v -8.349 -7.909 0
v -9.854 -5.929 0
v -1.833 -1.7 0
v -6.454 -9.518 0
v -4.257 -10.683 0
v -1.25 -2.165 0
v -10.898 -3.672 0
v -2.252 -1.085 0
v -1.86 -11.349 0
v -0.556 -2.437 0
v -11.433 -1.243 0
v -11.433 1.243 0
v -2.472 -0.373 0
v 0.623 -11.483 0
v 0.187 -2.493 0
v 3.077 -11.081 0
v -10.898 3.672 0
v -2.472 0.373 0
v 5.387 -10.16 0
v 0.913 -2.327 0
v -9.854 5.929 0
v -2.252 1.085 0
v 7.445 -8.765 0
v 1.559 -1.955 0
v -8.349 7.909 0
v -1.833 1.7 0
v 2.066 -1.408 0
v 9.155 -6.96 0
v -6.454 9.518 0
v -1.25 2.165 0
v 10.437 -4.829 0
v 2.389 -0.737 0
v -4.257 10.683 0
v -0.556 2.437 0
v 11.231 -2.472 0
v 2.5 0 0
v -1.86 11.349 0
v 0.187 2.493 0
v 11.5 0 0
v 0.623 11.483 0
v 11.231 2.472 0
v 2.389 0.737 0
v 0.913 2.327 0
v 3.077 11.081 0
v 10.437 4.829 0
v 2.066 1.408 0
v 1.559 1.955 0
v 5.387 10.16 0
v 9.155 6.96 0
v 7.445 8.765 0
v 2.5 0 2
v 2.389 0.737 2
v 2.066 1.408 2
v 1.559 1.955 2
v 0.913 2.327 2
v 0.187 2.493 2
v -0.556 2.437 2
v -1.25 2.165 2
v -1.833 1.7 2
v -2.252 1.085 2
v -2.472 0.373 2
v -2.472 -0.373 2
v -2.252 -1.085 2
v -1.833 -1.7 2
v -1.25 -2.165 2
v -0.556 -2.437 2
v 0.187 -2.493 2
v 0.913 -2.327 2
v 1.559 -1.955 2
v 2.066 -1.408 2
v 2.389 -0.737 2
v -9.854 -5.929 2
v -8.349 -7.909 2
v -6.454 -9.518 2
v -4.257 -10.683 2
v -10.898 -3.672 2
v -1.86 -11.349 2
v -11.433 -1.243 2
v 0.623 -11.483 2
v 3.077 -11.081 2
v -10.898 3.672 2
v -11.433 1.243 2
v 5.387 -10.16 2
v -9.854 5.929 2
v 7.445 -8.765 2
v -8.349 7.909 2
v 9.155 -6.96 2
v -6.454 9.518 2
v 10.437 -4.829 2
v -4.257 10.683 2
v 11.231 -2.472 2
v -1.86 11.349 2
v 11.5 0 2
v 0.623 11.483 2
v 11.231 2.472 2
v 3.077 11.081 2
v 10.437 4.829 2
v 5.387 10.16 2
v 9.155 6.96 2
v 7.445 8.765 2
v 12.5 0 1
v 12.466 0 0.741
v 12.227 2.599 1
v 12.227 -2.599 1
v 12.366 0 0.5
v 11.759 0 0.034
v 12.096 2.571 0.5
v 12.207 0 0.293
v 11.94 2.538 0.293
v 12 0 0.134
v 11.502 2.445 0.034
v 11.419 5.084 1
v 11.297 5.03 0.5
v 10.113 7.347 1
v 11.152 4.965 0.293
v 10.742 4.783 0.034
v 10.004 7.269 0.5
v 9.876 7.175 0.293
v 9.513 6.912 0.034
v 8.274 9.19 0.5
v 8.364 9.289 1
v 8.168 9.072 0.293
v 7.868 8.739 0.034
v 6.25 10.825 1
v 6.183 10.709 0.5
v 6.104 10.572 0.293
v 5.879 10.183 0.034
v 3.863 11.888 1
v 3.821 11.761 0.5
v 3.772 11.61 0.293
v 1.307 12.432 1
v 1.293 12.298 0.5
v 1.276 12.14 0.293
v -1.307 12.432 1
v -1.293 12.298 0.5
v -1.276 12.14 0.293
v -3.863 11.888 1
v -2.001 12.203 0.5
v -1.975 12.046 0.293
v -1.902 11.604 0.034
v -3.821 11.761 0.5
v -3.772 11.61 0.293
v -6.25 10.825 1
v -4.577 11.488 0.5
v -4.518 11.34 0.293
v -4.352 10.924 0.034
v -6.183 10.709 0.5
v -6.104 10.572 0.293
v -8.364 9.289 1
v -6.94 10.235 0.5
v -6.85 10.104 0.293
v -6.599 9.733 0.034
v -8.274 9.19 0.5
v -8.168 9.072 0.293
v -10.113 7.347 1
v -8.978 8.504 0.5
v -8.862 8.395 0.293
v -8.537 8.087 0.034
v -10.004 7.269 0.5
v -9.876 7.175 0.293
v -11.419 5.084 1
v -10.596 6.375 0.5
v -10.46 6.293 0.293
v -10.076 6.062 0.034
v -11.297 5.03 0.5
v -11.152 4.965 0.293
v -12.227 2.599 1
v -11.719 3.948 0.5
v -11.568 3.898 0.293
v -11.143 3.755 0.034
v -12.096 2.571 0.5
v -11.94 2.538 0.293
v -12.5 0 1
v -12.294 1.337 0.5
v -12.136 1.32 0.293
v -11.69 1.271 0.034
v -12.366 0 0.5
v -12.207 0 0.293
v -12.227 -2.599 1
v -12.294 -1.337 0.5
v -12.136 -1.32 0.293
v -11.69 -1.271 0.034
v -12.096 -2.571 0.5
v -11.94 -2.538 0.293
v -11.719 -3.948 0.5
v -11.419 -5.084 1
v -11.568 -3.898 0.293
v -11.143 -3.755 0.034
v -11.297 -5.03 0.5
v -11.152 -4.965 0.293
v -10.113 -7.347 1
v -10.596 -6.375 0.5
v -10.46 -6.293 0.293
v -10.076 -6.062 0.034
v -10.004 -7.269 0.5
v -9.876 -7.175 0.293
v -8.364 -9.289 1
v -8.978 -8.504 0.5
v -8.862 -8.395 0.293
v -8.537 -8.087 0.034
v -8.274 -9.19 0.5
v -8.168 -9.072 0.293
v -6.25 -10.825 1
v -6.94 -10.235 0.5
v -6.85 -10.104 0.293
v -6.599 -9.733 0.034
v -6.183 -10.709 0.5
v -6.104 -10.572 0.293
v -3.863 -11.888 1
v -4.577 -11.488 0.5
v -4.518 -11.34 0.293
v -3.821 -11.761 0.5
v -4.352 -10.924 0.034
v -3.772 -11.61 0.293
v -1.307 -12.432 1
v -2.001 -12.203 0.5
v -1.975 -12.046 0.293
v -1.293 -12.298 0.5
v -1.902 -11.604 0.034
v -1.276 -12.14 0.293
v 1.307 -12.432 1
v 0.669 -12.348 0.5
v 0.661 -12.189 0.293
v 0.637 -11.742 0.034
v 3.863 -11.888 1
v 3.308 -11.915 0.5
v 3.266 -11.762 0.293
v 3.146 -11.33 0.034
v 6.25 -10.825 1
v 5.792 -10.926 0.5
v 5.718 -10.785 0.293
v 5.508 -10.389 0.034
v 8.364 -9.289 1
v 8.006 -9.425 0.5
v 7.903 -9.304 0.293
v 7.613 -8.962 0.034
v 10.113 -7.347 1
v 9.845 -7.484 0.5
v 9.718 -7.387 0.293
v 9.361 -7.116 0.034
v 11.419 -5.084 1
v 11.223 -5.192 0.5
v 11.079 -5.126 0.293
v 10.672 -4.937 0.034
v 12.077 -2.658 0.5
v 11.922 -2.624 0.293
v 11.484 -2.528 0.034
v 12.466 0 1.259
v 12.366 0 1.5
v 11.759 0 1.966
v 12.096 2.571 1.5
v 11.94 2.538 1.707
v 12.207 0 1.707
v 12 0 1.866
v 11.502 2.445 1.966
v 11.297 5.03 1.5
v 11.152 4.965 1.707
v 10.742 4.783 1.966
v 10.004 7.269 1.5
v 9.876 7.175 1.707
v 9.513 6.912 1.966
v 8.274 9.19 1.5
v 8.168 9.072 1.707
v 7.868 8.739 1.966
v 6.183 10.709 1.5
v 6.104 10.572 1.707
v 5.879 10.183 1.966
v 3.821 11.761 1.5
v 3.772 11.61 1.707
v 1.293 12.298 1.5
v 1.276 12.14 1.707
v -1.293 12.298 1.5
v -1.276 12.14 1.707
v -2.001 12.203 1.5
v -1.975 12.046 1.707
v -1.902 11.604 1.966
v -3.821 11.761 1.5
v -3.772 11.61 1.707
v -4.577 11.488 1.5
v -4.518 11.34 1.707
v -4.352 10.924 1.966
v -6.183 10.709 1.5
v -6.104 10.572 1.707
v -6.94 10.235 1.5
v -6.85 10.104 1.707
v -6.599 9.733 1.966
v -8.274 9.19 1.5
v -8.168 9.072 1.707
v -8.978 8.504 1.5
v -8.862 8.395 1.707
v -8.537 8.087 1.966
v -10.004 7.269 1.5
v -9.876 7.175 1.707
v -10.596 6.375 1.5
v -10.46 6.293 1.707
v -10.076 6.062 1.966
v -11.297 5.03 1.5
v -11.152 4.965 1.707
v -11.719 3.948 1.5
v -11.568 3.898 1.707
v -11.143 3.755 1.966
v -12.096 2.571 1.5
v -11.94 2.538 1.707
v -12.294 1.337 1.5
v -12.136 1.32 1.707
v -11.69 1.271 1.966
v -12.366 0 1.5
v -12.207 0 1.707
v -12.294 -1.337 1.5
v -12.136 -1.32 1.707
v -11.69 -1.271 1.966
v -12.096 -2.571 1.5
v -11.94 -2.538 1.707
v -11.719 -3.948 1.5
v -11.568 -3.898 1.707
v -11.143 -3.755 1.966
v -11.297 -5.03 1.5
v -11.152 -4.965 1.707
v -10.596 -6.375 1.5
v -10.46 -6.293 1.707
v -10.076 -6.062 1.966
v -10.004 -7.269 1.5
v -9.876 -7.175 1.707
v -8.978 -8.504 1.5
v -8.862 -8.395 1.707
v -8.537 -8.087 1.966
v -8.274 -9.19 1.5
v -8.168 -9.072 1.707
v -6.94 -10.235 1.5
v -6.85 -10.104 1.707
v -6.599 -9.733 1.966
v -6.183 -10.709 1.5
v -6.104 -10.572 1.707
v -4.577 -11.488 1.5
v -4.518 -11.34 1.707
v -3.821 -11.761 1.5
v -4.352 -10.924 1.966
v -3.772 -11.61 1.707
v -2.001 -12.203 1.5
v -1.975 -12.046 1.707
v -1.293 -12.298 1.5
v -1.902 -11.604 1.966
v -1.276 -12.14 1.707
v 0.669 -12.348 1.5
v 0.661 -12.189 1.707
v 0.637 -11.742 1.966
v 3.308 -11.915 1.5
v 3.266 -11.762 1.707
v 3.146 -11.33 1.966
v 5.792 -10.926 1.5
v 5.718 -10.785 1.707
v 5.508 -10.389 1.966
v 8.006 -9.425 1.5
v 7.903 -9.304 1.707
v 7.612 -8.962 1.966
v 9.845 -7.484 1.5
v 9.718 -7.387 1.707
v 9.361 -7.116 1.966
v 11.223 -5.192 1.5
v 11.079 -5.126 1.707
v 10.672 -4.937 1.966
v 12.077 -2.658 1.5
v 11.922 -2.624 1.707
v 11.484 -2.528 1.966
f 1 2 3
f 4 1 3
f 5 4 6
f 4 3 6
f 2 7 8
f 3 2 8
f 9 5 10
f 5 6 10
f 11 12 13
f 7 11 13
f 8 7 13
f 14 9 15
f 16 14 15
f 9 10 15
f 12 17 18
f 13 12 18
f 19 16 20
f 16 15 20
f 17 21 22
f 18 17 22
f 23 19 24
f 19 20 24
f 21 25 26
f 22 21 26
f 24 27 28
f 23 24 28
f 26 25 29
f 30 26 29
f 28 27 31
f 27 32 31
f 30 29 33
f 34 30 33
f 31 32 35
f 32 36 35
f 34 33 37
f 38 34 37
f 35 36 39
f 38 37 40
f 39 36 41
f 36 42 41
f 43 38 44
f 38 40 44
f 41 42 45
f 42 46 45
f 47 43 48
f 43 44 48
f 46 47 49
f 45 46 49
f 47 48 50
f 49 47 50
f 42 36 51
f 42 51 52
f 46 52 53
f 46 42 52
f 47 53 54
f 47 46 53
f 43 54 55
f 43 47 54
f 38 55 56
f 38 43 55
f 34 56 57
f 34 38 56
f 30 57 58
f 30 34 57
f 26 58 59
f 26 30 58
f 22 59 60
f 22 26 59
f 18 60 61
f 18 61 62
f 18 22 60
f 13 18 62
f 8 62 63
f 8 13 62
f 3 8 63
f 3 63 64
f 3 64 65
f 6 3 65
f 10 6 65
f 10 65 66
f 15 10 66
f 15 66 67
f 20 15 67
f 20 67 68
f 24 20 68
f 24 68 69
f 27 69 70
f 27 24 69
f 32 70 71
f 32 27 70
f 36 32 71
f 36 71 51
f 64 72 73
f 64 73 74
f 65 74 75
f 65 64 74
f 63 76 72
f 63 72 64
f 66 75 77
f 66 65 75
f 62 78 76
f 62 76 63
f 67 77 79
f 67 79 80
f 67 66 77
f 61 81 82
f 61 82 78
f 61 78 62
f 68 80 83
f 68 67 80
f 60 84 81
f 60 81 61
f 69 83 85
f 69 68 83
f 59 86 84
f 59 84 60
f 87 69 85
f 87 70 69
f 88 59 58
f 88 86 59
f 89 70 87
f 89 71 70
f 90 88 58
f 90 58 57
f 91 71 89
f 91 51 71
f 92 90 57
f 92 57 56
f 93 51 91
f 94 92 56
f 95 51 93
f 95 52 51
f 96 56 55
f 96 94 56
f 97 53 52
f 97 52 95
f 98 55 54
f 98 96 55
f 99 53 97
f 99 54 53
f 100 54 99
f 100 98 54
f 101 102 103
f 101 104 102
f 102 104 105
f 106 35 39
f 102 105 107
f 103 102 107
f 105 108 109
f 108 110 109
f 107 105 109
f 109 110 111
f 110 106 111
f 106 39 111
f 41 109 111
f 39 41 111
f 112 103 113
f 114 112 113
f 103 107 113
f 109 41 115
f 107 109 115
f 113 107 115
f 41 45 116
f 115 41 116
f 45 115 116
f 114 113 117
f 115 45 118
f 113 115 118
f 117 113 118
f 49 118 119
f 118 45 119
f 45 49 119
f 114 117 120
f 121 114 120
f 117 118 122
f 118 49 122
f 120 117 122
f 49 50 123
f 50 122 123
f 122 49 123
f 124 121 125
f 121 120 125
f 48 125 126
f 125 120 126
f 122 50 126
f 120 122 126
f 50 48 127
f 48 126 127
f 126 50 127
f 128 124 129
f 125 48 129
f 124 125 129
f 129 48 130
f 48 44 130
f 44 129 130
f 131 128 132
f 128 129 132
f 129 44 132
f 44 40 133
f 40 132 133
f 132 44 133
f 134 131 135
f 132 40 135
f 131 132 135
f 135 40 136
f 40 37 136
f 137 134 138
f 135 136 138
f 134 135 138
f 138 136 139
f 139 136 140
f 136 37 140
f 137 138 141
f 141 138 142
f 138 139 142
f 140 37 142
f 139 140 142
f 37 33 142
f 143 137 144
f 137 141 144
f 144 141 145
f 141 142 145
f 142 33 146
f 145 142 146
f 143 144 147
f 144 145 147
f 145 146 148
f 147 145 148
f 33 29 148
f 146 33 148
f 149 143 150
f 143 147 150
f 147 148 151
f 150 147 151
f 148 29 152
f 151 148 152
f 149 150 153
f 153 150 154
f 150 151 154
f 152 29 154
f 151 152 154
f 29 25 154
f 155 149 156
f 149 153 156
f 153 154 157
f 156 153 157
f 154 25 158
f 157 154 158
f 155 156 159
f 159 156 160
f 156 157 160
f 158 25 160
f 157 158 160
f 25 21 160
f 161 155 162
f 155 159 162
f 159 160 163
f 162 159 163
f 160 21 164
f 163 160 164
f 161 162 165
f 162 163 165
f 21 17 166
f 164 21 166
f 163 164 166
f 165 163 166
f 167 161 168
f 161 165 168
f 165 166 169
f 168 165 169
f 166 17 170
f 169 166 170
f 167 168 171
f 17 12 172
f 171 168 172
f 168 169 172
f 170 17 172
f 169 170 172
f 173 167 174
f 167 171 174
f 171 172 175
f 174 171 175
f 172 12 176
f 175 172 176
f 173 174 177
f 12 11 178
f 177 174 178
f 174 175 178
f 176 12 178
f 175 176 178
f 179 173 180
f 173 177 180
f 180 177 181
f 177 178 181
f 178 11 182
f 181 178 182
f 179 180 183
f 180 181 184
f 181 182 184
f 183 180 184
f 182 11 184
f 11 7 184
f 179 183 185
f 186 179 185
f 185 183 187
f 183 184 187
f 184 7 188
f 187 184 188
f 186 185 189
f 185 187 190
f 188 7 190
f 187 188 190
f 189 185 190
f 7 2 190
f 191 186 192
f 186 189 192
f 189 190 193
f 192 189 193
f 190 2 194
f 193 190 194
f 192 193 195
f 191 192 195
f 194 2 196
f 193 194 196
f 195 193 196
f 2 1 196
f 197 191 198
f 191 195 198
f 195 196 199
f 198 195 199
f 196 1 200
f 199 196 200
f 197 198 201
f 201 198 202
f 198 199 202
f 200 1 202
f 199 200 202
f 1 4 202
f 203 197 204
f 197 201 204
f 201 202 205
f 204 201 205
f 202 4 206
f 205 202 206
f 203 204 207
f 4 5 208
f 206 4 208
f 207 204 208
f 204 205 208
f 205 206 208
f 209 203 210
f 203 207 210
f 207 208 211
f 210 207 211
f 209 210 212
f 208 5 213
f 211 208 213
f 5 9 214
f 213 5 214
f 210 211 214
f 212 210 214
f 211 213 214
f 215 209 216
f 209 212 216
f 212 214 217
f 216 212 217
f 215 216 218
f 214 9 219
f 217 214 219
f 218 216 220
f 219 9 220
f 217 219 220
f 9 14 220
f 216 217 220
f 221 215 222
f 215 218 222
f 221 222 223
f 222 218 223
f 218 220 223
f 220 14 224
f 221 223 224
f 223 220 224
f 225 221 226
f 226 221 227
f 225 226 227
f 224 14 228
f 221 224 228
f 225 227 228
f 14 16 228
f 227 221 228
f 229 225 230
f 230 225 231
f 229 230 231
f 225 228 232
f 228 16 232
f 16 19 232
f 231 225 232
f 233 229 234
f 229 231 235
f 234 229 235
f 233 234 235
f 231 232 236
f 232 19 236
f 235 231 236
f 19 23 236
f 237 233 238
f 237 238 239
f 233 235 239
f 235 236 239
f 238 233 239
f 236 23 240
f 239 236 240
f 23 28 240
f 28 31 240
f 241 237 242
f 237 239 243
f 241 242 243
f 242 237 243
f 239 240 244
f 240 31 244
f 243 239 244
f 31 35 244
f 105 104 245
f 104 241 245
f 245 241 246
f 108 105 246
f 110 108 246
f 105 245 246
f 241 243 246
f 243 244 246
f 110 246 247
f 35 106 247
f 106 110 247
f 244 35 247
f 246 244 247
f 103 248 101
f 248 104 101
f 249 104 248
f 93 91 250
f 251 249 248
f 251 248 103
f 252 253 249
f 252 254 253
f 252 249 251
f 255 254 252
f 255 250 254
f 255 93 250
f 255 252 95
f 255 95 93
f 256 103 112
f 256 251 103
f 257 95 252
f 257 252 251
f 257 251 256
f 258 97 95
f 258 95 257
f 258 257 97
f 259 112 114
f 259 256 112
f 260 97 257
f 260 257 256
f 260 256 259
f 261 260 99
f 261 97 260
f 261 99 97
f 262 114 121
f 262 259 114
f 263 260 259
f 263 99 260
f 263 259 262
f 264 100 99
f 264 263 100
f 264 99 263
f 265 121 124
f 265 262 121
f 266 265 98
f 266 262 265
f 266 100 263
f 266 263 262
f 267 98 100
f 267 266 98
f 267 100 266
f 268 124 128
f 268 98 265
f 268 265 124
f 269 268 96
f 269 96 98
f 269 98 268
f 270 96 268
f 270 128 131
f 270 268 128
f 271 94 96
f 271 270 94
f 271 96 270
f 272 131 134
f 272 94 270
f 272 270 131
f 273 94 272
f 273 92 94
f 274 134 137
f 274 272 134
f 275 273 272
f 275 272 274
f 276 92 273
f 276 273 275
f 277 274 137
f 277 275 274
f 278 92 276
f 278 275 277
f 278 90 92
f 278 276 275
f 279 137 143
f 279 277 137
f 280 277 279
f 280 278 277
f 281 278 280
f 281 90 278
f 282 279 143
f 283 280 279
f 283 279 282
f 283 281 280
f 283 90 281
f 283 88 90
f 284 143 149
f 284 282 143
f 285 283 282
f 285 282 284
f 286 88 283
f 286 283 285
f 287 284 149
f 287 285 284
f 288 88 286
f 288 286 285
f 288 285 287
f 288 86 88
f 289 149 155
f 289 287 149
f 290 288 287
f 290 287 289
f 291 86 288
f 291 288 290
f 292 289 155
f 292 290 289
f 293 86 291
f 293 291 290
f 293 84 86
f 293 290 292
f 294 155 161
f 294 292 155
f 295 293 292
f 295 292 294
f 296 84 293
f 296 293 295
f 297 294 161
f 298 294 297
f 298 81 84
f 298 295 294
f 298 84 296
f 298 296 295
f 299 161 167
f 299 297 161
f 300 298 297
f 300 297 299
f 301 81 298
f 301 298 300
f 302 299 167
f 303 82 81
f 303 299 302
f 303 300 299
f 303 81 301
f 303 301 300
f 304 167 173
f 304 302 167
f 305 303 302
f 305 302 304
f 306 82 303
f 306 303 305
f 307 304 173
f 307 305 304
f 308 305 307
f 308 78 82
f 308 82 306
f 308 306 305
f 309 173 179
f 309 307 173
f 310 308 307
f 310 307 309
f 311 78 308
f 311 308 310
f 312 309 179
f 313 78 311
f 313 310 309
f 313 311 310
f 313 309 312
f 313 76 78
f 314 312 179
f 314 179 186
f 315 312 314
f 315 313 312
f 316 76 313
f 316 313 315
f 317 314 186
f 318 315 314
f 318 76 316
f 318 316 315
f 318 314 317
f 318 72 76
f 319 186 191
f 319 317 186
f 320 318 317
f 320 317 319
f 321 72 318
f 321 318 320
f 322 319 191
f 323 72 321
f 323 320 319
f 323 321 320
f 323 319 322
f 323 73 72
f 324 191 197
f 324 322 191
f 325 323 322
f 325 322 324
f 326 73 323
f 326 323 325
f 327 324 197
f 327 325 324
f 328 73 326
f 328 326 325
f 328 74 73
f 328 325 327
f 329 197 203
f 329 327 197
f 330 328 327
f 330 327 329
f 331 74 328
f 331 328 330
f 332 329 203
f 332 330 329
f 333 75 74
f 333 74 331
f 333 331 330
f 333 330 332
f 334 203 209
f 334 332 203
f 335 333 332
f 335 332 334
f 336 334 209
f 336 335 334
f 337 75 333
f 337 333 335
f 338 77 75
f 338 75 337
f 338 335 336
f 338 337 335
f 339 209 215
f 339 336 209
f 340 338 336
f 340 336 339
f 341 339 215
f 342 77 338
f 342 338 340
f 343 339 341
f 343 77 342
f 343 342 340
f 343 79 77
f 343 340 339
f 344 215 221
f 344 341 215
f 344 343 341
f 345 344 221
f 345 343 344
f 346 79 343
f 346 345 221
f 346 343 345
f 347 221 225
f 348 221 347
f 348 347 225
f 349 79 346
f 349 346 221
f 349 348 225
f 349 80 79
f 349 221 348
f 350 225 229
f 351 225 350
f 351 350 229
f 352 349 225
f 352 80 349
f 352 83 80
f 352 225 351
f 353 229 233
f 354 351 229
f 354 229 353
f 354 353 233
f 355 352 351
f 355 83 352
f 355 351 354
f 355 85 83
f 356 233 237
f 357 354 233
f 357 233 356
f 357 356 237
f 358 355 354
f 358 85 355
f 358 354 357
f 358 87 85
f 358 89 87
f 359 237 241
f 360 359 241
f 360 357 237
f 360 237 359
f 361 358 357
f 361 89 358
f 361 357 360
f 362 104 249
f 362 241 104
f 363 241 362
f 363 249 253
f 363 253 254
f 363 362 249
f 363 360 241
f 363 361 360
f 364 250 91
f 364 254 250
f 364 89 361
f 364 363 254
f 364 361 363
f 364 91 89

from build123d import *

# Parameters (mm, degrees)
F0_R     = 12.5
F0_R_2   = 2.5
F1_DEPTH = 2
F2_R     = 1
F3_R     = 0.99999


# Not quite as in the source:
# - a fillet or chamfer is up to 0.001 mm smaller than in the source, because OpenCascade refuses the exact size


with BuildPart() as f1:
    # F0 (on Top) → F1 (new body)
    with BuildSketch(Plane.XY):
        Circle(F0_R)
        Circle(F0_R_2, mode=Mode.SUBTRACT)
    extrude(amount=F1_DEPTH)

    # F2
    f2_edges = [f1.edges().sort_by_distance(p)[0] for p in [
        (-12.5, 0, 2),
    ]]
    fillet(f2_edges, radius=F2_R)

    # F3 (radius 1 in the source; OpenCascade refuses exactly that, so slightly less here)
    f3_edges = [f1.edges().sort_by_distance(p)[0] for p in [
        (-12.5, 0, 0),
    ]]
    fillet(f3_edges, radius=F3_R)


solid = f1.part
